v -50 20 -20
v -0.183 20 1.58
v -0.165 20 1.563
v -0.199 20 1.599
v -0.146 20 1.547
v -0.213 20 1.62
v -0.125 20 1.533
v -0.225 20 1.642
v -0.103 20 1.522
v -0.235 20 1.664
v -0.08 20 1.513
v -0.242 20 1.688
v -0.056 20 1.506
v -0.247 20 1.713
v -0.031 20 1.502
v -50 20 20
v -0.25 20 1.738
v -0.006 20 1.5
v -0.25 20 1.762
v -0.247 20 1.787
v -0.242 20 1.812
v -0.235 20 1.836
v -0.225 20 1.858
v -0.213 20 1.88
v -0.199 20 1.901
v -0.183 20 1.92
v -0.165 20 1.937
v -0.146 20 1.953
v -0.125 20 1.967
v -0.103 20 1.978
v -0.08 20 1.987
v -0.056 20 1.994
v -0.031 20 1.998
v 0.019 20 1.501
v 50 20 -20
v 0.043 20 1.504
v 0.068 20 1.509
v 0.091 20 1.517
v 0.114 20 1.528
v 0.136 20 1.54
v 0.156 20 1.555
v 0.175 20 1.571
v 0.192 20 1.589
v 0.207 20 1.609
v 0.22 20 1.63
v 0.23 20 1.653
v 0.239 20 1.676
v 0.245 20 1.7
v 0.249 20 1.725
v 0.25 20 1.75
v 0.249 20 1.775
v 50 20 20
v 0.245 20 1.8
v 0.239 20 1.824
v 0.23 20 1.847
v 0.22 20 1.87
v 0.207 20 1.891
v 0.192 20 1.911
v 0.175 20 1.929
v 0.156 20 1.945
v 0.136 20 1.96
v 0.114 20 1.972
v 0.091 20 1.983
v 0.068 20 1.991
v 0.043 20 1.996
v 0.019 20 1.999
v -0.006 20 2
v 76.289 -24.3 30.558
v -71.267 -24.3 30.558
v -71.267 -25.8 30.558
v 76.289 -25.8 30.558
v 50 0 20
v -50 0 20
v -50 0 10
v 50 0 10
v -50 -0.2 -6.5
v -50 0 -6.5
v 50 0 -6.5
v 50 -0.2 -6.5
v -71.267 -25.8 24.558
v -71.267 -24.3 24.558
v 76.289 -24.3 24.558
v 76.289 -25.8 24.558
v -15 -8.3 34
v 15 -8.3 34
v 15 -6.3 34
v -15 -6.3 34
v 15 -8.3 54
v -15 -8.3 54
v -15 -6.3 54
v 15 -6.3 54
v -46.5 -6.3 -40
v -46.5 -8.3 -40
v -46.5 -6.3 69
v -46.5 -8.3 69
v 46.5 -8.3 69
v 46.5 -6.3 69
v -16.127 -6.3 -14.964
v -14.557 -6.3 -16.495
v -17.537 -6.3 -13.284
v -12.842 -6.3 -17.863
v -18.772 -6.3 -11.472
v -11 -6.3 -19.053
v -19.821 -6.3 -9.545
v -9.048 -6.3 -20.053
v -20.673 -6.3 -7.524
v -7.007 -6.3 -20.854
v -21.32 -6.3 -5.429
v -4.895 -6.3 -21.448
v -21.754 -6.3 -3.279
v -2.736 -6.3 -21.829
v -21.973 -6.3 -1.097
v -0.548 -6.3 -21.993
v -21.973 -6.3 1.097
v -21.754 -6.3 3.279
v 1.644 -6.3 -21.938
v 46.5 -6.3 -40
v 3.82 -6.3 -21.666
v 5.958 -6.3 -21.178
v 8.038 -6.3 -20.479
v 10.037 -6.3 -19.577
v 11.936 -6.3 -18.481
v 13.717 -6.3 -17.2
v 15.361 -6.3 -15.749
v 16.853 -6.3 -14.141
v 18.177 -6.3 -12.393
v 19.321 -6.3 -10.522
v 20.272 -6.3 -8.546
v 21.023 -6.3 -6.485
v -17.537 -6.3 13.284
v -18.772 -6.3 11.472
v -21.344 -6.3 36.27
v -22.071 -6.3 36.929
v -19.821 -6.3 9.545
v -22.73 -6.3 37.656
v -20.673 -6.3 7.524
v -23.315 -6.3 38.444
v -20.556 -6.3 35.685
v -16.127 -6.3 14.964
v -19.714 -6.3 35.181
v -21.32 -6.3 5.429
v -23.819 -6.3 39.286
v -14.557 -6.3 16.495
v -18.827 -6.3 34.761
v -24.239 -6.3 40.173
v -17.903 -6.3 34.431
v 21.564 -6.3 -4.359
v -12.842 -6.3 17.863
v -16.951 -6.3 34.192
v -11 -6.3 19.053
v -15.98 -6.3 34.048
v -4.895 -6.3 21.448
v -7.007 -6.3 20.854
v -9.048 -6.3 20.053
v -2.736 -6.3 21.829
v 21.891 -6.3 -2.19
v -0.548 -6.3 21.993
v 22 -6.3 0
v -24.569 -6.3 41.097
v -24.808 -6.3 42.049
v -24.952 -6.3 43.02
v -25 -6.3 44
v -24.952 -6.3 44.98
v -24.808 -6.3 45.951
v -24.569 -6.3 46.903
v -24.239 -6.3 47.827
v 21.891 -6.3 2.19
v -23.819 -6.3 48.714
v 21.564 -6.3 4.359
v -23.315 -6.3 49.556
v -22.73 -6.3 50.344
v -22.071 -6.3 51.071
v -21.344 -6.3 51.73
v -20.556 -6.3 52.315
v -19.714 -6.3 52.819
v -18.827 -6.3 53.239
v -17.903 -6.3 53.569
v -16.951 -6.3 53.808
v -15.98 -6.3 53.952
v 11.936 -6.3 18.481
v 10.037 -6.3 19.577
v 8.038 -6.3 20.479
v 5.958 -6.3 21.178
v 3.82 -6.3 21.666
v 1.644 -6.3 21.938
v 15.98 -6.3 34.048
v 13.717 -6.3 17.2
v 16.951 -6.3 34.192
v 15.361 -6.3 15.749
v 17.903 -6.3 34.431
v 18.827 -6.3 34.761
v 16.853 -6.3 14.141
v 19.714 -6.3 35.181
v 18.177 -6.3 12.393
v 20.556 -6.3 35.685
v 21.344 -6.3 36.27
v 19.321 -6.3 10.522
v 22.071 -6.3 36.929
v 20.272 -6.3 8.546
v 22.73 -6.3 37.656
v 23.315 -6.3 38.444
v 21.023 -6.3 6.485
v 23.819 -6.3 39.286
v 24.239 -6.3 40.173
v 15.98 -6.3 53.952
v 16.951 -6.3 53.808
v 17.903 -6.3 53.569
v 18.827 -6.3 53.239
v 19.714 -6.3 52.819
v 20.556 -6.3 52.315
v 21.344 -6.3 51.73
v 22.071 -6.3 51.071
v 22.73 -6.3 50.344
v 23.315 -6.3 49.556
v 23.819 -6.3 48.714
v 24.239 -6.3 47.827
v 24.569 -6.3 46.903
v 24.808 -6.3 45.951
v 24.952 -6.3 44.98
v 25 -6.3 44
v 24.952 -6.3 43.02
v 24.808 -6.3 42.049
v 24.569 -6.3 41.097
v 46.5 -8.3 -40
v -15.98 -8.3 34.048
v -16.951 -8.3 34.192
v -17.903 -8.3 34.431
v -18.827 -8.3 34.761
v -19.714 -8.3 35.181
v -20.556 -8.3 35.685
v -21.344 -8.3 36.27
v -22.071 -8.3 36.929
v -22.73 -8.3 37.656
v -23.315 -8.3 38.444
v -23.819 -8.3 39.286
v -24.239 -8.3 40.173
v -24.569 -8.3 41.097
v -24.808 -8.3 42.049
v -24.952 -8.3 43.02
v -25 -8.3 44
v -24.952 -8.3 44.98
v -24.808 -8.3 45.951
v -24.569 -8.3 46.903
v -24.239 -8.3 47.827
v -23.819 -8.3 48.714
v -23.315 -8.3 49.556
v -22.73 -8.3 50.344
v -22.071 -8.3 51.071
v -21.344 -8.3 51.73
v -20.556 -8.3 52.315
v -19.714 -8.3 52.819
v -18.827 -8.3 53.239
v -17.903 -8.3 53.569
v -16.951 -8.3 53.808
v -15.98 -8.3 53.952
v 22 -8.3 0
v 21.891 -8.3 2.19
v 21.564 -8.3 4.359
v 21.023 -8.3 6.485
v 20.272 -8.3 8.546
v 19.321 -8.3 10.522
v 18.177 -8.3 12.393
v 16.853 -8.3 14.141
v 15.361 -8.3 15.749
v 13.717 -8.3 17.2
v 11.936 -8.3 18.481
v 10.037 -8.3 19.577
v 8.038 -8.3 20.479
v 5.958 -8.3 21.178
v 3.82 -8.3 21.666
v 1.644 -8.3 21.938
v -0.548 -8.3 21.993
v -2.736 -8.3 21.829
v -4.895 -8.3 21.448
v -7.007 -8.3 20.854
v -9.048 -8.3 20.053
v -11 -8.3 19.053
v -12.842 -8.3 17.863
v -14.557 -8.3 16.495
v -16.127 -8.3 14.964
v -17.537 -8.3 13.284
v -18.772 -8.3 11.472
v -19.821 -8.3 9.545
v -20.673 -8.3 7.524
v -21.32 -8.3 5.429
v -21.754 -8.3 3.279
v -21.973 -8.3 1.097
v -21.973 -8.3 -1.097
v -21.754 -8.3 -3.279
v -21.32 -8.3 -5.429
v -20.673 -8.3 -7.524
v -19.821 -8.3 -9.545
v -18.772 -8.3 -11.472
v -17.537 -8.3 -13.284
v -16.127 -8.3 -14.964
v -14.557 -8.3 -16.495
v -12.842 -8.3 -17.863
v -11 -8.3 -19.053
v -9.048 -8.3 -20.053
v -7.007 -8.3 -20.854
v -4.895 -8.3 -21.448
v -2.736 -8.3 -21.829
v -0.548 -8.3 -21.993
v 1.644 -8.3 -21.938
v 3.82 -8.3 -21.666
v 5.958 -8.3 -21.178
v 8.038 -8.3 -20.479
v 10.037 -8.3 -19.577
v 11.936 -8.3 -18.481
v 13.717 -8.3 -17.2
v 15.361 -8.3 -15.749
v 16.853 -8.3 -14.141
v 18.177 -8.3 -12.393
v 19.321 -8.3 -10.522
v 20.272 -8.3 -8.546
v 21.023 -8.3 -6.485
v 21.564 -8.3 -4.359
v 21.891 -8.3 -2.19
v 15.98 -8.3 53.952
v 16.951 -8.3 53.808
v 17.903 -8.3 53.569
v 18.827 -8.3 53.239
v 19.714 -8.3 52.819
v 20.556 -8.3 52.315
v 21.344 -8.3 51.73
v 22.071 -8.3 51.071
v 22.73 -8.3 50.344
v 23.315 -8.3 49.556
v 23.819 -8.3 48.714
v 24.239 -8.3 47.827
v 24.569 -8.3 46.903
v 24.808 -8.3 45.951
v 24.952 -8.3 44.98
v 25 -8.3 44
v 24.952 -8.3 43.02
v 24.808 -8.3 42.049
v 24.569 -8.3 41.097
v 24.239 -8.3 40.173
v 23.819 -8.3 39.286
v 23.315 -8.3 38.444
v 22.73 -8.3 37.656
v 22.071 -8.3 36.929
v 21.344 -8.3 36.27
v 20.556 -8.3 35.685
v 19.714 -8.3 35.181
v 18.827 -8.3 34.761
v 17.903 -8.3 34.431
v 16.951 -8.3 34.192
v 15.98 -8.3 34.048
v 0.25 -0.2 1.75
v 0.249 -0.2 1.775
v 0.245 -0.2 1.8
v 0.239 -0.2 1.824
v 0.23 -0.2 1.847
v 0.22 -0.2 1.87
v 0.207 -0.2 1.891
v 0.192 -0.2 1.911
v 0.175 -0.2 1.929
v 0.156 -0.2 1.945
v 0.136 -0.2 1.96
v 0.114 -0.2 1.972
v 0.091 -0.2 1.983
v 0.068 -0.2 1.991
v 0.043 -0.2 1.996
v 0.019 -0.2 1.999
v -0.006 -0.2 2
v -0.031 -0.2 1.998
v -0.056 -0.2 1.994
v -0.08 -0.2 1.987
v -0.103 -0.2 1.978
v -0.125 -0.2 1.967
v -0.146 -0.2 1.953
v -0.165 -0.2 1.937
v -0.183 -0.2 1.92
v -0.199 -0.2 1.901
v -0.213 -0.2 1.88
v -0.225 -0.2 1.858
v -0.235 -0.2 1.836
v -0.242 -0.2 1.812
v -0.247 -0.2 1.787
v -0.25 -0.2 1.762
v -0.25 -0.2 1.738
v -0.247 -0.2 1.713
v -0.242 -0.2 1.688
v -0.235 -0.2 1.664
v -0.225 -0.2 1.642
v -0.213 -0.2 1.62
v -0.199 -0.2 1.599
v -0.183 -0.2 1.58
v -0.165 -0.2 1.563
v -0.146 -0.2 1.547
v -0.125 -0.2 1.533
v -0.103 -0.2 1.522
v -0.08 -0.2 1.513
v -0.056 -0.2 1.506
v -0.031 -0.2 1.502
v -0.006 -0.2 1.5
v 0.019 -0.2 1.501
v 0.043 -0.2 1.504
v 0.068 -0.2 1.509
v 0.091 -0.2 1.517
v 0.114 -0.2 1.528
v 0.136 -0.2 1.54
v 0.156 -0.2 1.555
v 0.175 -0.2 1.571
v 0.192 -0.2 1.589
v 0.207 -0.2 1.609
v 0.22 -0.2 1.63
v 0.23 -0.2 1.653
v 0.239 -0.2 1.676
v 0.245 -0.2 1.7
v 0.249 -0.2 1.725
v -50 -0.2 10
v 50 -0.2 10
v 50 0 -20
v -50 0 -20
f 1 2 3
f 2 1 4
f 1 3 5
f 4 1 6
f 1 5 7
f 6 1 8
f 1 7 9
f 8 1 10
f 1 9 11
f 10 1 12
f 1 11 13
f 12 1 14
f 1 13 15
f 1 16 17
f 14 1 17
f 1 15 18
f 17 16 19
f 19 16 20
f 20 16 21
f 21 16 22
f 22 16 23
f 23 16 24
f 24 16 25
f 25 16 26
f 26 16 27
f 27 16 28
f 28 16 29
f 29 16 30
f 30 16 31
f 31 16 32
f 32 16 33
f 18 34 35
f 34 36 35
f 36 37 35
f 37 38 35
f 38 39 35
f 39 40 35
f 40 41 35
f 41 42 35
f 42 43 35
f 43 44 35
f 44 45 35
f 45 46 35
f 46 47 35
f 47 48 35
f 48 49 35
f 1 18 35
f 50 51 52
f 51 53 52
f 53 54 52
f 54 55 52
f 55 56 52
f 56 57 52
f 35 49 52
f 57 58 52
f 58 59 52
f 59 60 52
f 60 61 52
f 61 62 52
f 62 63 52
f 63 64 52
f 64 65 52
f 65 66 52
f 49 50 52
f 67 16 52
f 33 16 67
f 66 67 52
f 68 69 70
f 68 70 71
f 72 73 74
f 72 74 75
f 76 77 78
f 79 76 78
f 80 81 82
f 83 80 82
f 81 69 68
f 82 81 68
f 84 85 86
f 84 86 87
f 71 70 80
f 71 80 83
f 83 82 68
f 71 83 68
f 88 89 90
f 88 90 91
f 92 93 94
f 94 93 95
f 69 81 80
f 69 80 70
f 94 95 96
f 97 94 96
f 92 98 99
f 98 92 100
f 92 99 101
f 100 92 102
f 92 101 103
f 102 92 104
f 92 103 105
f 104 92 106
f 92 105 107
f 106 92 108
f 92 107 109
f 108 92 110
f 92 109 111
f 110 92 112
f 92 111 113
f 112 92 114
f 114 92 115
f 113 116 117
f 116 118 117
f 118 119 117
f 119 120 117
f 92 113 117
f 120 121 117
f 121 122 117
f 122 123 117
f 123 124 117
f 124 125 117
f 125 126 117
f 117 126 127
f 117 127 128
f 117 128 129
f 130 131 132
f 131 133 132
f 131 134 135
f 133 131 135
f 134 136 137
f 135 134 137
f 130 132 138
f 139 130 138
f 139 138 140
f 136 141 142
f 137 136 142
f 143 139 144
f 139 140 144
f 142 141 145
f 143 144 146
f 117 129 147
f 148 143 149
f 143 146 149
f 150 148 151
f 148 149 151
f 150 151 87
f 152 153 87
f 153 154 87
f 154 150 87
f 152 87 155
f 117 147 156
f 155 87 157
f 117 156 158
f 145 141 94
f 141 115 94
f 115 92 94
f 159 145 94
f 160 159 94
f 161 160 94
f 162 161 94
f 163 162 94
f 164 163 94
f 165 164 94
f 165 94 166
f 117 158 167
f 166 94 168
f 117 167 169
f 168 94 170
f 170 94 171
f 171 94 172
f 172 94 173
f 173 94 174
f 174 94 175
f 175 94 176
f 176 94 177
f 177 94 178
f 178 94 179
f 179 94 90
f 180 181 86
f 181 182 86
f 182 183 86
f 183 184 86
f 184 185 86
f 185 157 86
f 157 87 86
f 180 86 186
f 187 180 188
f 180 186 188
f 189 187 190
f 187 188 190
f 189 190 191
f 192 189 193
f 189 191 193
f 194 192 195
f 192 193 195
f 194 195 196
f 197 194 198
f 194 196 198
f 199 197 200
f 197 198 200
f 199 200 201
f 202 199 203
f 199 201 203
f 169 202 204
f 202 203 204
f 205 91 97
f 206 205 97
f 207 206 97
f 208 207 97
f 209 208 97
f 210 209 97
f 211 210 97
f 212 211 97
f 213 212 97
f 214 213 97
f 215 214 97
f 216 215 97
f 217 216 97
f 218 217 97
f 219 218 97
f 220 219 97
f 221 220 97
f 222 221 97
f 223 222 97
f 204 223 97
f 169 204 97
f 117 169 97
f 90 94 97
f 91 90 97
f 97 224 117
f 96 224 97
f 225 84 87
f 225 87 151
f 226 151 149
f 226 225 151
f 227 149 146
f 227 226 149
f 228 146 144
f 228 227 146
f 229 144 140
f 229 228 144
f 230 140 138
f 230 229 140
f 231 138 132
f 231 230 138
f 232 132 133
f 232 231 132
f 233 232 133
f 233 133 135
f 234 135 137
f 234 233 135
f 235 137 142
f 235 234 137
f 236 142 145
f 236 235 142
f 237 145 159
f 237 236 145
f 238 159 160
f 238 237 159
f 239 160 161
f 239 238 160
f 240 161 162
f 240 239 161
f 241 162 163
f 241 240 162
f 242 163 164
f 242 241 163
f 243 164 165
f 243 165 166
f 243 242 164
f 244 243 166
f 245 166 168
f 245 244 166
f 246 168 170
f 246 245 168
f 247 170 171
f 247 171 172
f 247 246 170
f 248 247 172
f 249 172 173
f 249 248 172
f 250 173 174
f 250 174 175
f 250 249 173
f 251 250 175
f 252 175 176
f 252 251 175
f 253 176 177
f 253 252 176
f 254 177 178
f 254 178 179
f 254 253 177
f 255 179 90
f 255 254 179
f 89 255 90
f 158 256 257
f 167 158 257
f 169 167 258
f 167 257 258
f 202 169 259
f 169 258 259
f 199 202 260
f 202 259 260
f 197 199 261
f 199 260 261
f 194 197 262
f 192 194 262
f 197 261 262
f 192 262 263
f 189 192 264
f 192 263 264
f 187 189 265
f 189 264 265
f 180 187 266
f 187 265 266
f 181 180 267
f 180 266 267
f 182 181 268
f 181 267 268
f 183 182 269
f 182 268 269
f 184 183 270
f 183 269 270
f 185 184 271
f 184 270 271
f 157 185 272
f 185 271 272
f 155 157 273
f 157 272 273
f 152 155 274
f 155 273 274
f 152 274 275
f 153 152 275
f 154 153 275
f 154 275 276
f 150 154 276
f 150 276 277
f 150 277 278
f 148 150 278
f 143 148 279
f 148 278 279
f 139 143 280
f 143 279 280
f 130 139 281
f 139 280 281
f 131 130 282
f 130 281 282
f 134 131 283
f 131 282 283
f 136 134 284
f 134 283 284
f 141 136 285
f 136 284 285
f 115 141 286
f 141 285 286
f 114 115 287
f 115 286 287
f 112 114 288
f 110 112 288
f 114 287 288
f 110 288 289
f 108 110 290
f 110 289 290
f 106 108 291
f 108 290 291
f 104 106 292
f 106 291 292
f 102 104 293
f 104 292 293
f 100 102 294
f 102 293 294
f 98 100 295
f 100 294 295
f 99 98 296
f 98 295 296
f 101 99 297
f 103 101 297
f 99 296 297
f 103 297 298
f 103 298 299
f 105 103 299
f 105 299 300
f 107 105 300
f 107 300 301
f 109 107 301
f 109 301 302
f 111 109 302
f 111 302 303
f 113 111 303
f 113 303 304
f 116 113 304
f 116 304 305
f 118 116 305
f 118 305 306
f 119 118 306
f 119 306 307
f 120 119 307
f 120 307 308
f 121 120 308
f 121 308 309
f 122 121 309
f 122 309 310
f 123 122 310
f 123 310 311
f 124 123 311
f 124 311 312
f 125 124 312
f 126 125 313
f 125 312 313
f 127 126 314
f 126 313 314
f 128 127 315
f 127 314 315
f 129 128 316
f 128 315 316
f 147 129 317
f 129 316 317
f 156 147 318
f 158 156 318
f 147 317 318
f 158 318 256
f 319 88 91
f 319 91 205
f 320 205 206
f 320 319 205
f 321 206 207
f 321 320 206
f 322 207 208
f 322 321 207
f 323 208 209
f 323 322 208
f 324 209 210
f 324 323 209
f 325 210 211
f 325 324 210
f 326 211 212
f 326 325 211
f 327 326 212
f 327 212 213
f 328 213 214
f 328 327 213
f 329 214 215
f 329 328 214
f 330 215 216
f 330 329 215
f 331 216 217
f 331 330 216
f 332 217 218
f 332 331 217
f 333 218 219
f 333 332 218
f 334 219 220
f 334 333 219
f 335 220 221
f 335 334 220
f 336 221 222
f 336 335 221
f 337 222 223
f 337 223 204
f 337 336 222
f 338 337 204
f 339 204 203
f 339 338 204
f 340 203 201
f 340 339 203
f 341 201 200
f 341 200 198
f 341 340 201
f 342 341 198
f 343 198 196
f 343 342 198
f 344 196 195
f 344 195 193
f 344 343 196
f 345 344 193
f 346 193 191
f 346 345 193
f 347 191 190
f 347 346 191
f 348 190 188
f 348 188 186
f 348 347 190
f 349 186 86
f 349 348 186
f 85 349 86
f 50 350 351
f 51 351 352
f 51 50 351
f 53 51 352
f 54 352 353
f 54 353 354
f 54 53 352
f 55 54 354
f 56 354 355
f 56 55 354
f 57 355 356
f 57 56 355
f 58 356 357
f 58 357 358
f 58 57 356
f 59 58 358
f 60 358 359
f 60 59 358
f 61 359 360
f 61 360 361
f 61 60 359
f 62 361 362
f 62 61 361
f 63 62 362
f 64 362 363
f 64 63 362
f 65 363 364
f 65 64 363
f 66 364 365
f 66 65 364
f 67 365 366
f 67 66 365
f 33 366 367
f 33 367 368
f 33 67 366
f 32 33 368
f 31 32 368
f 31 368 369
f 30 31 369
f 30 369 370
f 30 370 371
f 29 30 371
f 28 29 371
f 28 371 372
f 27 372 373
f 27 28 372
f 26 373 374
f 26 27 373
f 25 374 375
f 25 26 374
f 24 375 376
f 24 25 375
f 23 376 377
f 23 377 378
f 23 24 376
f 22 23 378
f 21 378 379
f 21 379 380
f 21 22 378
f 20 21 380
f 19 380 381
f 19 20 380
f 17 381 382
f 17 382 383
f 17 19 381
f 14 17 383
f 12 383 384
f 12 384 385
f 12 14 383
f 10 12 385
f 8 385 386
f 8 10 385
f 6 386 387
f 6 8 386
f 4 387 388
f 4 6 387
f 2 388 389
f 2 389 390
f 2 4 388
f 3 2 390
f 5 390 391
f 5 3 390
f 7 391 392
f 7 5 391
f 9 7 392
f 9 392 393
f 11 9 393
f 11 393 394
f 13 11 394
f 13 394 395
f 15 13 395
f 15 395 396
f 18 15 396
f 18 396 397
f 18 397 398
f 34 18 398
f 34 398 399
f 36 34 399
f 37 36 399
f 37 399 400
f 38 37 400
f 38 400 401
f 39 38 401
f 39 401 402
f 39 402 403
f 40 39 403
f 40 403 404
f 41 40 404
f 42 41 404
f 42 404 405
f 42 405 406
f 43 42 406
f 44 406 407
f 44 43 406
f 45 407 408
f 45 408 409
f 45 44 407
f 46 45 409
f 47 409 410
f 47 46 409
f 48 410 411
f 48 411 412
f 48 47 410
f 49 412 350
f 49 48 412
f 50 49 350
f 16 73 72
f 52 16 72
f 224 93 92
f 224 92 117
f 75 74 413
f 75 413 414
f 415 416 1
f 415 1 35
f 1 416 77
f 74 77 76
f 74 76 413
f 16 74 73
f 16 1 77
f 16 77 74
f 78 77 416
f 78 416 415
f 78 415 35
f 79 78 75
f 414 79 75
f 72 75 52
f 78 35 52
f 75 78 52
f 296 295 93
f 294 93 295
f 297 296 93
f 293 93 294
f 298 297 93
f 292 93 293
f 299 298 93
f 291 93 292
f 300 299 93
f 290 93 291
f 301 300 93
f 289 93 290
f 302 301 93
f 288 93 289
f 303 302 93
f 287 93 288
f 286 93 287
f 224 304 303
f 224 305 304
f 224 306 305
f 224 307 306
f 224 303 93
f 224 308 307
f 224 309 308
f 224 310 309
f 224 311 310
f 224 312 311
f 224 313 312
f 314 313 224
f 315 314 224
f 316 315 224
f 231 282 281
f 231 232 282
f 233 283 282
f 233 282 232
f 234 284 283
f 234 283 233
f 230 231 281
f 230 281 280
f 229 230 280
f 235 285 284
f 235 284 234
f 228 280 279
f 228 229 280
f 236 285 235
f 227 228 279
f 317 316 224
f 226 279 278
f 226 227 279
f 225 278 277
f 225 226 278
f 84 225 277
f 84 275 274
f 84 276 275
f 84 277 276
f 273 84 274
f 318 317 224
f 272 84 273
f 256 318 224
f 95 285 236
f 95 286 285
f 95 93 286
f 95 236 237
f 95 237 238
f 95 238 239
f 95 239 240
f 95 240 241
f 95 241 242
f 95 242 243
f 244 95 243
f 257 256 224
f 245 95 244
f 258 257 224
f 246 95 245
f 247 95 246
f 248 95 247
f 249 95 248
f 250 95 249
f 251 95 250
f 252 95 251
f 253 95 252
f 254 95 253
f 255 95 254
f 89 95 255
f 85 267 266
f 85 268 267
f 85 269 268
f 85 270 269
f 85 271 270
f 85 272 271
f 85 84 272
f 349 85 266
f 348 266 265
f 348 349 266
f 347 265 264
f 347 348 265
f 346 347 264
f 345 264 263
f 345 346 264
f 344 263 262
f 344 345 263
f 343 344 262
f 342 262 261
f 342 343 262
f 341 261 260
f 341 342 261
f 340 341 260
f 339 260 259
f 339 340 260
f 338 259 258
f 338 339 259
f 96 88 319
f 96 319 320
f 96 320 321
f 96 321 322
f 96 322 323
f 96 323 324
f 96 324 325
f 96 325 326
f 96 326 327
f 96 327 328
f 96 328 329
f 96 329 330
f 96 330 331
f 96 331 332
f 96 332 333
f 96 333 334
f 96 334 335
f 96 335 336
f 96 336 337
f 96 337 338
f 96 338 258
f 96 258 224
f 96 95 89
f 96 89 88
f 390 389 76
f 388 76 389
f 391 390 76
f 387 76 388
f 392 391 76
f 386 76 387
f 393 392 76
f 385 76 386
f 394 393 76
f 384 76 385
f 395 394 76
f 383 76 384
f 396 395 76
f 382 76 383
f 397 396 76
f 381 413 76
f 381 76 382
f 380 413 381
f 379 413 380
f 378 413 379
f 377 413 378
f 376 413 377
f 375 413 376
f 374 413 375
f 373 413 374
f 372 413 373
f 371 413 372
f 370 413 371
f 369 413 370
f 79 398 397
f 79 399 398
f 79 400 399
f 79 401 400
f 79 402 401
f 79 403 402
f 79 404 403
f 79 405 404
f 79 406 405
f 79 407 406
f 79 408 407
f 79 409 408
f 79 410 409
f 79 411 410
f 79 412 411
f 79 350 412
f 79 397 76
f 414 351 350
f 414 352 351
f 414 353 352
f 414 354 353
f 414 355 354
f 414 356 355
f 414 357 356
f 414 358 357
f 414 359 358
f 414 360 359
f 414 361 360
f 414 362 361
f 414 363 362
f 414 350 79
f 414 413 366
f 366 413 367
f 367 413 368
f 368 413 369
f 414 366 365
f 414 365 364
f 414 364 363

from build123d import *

# Parameters (mm, degrees)
F0_W     = 100
F0_H     = 10
F0_H_2   = 16.5
F0_R     = 0.25
F0_H_3   = 13.5
F1_DEPTH = 20
F2_DEPTH = 0.2
F4_W     = 93
F4_H     = 109
F4_R     = 22
F5_DEPTH = 2
F7_W     = 147.5555372408
F7_H     = 6
F8_DEPTH = 1.5


with BuildPart() as f1:
    # F0 (on Front) → F1 (new body)
    with BuildSketch(Plane.XZ):
        with Locations((0, 15)):
            Rectangle(F0_W, F0_H)
        with Locations((0, 1.75)):
            Rectangle(F0_W, F0_H_2)
        with Locations((0, 1.75)):
            Circle(F0_R, mode=Mode.SUBTRACT)
        with Locations((0, -13.25)):
            Rectangle(F0_W, F0_H_3)
    extrude(amount=-F1_DEPTH)

    # F0 (on Front) → F2 (join)
    with BuildSketch(Plane.XZ):
        with Locations((0, 1.75)):
            Rectangle(F0_W, F0_H_2)
        with Locations((0, 1.75)):
            Circle(F0_R, mode=Mode.SUBTRACT)
    extrude(amount=F2_DEPTH)


with BuildPart() as f5:
    # F4 (on offset) → F5 (new body)
    with BuildSketch(Plane.XZ.offset(8.3)):
        with Locations((0, 14.5)):
            Rectangle(F4_W, F4_H)
        Circle(F4_R, mode=Mode.SUBTRACT)
        with BuildLine():
            ThreePointArc((-15, 34), (-25, 44), (-15, 54))
            Line((-15, 54), (15, 54))
            ThreePointArc((15, 54), (25, 44), (15, 34))
            Line((15, 34), (-15, 34))
        make_face(mode=Mode.SUBTRACT)
    extrude(amount=-F5_DEPTH)


with BuildPart() as f8:
    # F7 (on offset) → F8 (new body)
    with BuildSketch(Plane.XZ.offset(24.3)):
        with Locations((2.5111660361, 27.5580342859)):
            Rectangle(F7_W, F7_H)
    extrude(amount=F8_DEPTH)


solid = Compound([f1.part, f5.part, f8.part])
